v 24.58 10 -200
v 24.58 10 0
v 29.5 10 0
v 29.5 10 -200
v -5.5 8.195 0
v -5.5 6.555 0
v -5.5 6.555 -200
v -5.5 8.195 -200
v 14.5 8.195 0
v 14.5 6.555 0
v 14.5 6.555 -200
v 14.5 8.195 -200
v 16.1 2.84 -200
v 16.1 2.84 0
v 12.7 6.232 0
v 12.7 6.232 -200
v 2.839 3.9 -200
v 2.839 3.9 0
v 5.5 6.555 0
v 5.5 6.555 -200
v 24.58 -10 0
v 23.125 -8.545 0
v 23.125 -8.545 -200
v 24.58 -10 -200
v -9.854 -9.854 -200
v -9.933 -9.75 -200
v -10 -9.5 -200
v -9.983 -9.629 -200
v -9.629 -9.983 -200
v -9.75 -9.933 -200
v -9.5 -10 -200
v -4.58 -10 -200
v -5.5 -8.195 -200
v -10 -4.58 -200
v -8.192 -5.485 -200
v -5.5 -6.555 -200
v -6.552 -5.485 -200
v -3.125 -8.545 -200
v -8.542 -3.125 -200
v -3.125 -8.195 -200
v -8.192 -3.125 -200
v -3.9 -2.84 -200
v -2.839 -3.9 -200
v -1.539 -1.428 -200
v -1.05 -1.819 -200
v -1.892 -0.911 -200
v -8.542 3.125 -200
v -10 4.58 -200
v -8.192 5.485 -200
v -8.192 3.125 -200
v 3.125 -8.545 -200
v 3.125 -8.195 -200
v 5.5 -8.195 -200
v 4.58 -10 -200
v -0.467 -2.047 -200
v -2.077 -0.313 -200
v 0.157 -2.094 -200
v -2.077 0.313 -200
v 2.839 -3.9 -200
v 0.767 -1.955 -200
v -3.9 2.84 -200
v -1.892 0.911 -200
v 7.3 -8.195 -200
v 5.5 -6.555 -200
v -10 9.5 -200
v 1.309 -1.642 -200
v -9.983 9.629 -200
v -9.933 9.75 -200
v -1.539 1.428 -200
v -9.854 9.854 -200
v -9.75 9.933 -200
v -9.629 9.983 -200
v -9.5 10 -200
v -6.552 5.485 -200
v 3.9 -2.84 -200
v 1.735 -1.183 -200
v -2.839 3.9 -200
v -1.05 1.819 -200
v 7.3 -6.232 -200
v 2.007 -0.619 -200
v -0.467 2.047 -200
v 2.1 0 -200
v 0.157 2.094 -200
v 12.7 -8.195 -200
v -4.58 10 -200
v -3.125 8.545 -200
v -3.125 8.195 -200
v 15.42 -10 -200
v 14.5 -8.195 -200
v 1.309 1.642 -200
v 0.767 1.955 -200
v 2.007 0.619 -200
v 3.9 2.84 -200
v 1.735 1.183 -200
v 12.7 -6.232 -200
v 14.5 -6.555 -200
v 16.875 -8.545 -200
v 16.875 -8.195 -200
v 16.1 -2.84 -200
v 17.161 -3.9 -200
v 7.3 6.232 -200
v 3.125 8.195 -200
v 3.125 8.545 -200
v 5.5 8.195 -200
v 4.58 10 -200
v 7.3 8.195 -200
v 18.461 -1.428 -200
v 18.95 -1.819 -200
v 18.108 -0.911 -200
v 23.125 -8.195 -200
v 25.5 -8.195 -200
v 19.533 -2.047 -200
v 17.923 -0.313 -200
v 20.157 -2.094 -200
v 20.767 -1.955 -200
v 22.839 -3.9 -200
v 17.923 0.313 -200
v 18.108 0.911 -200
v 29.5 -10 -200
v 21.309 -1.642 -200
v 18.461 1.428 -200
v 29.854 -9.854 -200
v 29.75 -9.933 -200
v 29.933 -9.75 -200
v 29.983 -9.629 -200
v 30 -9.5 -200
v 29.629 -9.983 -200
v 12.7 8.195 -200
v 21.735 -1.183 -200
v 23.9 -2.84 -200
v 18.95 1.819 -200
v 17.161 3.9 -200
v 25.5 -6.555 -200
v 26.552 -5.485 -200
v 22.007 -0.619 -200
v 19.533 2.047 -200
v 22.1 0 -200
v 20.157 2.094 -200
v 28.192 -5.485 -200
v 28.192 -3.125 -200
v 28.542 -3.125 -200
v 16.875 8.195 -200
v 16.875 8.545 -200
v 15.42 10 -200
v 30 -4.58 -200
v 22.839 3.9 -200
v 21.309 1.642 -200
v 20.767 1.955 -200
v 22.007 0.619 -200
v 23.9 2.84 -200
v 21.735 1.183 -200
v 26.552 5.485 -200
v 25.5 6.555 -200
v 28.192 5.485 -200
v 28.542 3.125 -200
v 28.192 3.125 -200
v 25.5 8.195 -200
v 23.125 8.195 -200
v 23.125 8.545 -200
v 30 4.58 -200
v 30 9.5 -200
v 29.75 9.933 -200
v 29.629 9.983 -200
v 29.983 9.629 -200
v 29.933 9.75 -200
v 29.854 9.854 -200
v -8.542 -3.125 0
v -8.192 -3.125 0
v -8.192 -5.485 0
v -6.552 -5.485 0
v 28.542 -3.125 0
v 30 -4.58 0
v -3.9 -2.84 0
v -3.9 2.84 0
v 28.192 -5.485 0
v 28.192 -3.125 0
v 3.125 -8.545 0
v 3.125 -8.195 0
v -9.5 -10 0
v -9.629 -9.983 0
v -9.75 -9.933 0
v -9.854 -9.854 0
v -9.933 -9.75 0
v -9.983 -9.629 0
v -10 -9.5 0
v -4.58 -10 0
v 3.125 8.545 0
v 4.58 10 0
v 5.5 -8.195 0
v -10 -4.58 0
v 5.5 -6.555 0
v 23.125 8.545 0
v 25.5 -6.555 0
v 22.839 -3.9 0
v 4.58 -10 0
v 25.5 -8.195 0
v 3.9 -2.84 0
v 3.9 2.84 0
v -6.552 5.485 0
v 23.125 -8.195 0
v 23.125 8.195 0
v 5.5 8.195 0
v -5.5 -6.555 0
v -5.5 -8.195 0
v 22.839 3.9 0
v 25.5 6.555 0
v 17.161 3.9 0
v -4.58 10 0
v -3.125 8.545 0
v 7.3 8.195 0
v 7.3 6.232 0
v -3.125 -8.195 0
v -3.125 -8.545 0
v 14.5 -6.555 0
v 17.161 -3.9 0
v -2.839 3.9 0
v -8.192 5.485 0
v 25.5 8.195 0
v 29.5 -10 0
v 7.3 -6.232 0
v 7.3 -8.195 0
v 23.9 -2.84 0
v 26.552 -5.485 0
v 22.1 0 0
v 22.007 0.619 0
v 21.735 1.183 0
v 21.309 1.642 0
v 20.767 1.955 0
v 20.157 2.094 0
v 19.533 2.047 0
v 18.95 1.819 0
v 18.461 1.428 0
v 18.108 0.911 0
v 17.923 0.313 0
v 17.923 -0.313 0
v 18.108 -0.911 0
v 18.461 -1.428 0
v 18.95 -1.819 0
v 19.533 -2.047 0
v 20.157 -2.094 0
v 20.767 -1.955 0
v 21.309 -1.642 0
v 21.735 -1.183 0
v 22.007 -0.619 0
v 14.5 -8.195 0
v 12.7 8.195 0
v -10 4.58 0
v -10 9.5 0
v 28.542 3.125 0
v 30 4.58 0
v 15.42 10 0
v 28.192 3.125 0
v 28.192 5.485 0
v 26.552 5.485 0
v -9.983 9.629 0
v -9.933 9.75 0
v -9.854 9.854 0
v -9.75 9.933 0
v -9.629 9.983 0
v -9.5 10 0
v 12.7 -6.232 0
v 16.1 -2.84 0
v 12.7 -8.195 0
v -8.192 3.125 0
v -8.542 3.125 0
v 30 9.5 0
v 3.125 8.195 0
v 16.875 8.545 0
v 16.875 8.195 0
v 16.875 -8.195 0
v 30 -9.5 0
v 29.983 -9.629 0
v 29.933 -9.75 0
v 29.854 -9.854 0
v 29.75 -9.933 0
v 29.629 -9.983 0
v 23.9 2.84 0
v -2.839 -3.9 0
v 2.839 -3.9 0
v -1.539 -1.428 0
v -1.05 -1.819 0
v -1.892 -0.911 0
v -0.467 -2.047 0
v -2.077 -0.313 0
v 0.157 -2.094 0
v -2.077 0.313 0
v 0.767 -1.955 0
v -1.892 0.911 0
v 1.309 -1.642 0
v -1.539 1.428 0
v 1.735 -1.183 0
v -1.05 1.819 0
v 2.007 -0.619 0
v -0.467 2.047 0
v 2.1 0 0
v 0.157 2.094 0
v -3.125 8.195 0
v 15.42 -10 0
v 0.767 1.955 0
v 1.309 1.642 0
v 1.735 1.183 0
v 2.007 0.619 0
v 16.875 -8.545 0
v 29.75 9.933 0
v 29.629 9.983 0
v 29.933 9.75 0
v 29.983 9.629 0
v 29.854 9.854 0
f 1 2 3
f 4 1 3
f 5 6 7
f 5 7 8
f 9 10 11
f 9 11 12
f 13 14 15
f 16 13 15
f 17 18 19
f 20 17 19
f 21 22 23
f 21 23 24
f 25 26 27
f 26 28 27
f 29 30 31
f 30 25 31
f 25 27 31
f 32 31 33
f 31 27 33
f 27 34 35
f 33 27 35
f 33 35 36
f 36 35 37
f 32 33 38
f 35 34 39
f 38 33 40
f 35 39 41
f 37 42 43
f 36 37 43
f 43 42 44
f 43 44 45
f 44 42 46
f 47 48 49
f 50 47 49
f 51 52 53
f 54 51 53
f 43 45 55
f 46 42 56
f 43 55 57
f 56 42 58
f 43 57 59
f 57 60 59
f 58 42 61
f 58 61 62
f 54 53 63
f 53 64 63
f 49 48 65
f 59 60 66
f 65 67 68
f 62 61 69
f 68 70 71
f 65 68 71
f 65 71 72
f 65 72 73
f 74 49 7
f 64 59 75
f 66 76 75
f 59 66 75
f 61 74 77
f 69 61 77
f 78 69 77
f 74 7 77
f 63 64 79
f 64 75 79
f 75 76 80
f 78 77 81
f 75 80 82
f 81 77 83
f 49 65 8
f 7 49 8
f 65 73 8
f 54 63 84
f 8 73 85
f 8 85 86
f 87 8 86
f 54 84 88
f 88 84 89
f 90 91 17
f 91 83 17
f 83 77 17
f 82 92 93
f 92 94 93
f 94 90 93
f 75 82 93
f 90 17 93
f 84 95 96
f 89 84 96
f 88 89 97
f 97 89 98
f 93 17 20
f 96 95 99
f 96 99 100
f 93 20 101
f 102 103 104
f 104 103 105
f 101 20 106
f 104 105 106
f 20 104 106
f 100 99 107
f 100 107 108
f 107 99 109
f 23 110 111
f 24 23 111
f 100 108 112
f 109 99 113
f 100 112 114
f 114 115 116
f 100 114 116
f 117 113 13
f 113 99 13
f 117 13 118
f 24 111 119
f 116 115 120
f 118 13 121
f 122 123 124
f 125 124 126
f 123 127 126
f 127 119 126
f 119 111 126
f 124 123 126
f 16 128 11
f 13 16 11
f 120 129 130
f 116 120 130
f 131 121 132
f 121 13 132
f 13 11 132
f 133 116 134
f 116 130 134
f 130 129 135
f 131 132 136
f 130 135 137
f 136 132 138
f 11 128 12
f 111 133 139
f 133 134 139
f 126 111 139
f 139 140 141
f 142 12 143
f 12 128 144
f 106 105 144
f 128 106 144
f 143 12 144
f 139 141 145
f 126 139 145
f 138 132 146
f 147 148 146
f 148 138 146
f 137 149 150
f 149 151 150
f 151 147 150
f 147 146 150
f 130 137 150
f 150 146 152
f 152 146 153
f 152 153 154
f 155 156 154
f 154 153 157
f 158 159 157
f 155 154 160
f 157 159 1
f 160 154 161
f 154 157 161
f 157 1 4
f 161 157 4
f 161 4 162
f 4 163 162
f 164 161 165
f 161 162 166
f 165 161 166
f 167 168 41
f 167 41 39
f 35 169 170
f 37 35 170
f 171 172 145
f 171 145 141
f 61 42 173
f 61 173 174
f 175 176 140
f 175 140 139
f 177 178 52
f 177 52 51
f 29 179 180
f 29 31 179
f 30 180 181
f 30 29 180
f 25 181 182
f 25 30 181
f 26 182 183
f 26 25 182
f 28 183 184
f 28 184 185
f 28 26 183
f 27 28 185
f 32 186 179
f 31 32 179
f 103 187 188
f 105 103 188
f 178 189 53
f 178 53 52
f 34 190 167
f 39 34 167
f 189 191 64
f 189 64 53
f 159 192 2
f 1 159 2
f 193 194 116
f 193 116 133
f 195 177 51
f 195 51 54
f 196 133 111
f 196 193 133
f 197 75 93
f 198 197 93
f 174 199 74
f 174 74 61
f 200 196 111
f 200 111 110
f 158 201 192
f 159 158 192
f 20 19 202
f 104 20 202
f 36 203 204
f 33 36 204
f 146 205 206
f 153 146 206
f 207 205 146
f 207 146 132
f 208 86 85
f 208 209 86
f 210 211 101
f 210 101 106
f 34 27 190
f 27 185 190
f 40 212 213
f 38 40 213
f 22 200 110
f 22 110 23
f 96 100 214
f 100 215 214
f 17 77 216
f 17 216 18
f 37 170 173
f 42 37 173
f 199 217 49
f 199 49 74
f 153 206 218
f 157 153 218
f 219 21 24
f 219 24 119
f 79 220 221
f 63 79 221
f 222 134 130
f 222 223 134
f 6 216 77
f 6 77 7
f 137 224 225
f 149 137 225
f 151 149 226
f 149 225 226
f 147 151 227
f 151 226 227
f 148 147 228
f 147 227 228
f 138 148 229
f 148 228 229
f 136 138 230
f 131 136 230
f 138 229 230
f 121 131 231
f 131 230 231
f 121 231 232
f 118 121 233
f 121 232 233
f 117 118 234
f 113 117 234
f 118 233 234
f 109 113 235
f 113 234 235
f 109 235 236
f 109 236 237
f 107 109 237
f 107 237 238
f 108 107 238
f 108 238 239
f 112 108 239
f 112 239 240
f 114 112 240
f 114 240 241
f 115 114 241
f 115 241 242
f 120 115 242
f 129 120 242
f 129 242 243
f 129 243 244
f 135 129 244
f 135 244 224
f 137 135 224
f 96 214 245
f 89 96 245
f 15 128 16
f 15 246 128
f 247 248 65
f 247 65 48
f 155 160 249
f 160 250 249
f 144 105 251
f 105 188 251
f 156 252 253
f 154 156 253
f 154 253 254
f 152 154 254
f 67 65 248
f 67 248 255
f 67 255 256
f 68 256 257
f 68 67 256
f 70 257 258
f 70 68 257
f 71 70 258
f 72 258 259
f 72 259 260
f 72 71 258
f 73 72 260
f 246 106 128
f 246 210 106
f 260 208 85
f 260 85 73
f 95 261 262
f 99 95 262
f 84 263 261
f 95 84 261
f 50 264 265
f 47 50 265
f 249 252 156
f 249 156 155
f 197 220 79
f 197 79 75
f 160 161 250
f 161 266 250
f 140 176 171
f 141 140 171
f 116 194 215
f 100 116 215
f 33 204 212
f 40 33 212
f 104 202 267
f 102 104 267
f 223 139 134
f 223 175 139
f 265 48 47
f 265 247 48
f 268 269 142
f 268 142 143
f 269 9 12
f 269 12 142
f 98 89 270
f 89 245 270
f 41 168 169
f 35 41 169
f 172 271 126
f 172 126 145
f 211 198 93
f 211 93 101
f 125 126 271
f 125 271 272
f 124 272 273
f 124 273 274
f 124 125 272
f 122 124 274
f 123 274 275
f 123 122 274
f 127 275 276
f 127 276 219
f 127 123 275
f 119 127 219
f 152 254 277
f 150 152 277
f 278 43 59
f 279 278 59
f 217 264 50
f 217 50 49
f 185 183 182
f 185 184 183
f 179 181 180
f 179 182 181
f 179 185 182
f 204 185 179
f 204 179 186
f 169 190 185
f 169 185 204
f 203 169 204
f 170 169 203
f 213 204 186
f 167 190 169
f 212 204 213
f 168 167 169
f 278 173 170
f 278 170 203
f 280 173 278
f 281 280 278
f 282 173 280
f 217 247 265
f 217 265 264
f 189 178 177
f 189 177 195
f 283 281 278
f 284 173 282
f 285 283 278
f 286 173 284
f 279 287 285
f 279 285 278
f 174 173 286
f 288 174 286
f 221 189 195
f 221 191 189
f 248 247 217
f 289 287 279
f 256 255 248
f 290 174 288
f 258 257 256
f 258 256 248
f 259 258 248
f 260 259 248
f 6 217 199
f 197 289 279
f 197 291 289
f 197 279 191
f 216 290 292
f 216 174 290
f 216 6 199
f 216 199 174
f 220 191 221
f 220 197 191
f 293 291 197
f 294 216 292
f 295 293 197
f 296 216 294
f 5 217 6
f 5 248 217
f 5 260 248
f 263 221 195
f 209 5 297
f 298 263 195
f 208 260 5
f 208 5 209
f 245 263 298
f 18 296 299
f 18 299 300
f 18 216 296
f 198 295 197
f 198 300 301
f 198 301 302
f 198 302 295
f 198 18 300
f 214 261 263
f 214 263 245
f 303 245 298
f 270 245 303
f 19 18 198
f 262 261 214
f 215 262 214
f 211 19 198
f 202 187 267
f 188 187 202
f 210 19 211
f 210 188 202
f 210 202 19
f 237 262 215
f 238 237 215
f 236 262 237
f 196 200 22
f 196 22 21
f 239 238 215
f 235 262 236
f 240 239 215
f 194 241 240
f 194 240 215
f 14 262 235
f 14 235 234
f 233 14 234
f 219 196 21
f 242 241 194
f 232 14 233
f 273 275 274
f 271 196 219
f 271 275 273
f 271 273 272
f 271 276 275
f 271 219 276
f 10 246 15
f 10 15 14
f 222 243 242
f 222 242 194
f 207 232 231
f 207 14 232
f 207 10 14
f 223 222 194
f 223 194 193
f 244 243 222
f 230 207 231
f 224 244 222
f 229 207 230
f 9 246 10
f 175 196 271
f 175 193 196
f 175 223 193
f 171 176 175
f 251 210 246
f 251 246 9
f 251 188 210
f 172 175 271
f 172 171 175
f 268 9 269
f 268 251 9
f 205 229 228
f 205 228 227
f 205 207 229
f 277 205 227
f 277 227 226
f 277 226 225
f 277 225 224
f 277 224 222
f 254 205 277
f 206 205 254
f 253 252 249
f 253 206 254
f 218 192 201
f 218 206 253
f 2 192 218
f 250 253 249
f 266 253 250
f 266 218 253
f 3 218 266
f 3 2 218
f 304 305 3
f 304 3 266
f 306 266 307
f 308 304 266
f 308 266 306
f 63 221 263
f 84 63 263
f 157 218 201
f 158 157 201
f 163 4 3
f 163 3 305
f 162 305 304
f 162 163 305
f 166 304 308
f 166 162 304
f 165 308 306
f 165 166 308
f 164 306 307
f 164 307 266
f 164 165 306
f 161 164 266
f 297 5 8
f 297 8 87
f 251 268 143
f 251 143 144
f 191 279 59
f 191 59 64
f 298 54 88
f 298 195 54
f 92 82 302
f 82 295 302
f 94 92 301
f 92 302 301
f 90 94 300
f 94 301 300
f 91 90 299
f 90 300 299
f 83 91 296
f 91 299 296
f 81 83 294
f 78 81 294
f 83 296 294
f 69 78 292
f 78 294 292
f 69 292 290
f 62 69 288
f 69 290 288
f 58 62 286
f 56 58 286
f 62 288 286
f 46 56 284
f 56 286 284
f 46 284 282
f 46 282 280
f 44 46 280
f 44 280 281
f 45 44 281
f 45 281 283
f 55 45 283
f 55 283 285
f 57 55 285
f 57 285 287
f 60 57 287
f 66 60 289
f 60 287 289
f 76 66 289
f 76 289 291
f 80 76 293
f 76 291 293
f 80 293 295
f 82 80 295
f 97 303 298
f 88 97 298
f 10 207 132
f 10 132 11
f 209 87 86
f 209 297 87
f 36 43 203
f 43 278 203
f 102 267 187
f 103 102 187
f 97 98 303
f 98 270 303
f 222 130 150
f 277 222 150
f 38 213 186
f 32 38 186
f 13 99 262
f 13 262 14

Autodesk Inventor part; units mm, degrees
ref_plane "YZ Plane" through (0, 0, 0) normal (1, 0, 0) x (0, 1, 0)
ref_plane "XZ Plane" through (0, 0, 0) normal (0, 1, 0) x (-1, 0, 0)
ref_plane "XY Plane" through (0, 0, 0) normal (0, 0, 1) x (1, 0, 0)
sketch "Boceto1" plane through (0, 0, 0) normal (0, 0, 1) x (1, 0, 0)
  circle A0 centre (0, 0) radius 2.1
  line L0 (-12, 0) -> (12, 0)
  line L1 (0, 12) -> (0, -12)
  line L2 (0, 3.9) -> (-2.8387, 3.9)
  line L3 (-2.8387, 3.9) -> (-5.5, 6.555)
  line L4 (-5.5, 6.555) -> (-5.5, 8.195)
  line L5 (-5.5, 8.195) -> (-3.125, 8.195)
  line L6 (-3.125, 8.545) -> (-4.58, 10)
  line L7 (-4.58, 10) -> (-10, 10)
  line L8 (-10, 10) -> (-10, 4.58)
  line L9 (-10, 4.58) -> (-8.5415, 3.125)
  line L10 (-8.1915, 3.125) -> (-8.1915, 5.4852)
  line L11 (-8.1915, 5.4852) -> (-6.5515, 5.4852)
  line L12 (-6.5515, 5.4852) -> (-3.9, 2.84)
  line L13 (-3.9, 2.84) -> (-3.9, 0)
  line L14 (3.125, 8.545) -> (4.58, 10)
  line L15 (5.5, 8.195) -> (3.125, 8.195)
  line L16 (5.5, 6.555) -> (5.5, 8.195)
  line L17 (2.8387, 3.9) -> (5.5, 6.555)
  line L18 (0, 3.9) -> (2.8387, 3.9)
  line L19 (3.9, 2.84) -> (3.9, 0)
  line L20 (-10, -10) -> (-10, -4.58)
  line L21 (-4.58, -10) -> (-10, -10)
  line L22 (-3.125, -8.545) -> (-4.58, -10)
  line L23 (-5.5, -8.195) -> (-3.125, -8.195)
  line L24 (-5.5, -6.555) -> (-5.5, -8.195)
  line L25 (-2.8387, -3.9) -> (-5.5, -6.555)
  line L26 (0, -3.9) -> (-2.8387, -3.9)
  line L27 (0, -3.9) -> (2.8387, -3.9)
  line L28 (2.8387, -3.9) -> (5.5, -6.555)
  line L29 (5.5, -6.555) -> (5.5, -8.195)
  line L30 (5.5, -8.195) -> (3.125, -8.195)
  line L31 (3.125, -8.545) -> (4.58, -10)
  line L32 (7.3, -6.2319) -> (3.9, -2.84)
  line L33 (3.9, -2.84) -> (3.9, 0)
  line L34 (-3.9, -2.84) -> (-3.9, 0)
  line L35 (-6.5515, -5.4852) -> (-3.9, -2.84)
  line L36 (-8.1915, -5.4852) -> (-6.5515, -5.4852)
  line L37 (-8.1915, -3.125) -> (-8.1915, -5.4852)
  line L38 (-10, -4.58) -> (-8.5415, -3.125)
  line L39 (-3.125, 8.195) -> (-3.125, 8.545)
  line L40 (-8.1915, 3.125) -> (-8.5415, 3.125)
  line L41 (3.125, 8.195) -> (3.125, 8.545)
  line L42 (-8.1915, -3.125) -> (-8.5415, -3.125)
  line L43 (-3.125, -8.195) -> (-3.125, -8.545)
  line L44 (3.125, -8.195) -> (3.125, -8.545)
  line L45 (10, 12) -> (10, -12)
  line L46 (16.875, 8.195) -> (16.875, 8.545)
  line L47 (14.5, 8.195) -> (16.875, 8.195)
  line L48 (14.5, 6.555) -> (14.5, 8.195)
  line L49 (16.875, 8.545) -> (15.42, 10)
  line L50 (17.1613, 3.9) -> (14.5, 6.555)
  line L51 (20, 3.9) -> (17.1613, 3.9)
  line L52 (32, 0) -> (8, 0)
  line L53 (20, 3.9) -> (22.8387, 3.9)
  line L54 (23.125, 8.195) -> (23.125, 8.545)
  circle A1 centre (20, 0) radius 2.1
  line L55 (23.9, -2.84) -> (23.9, 0)
  line L56 (26.5515, -5.4852) -> (23.9, -2.84)
  line L57 (28.1915, -5.4852) -> (26.5515, -5.4852)
  line L58 (24.58, -10) -> (30, -10)
  line L59 (30, -10) -> (30, -4.58)
  line L60 (28.1915, -3.125) -> (28.1915, -5.4852)
  line L61 (30, -4.58) -> (28.5415, -3.125)
  line L62 (28.1915, -3.125) -> (28.5415, -3.125)
  line L63 (22.8387, -3.9) -> (25.5, -6.555)
  line L64 (25.5, -8.195) -> (23.125, -8.195)
  line L65 (23.125, -8.195) -> (23.125, -8.545)
  line L66 (23.125, -8.545) -> (24.58, -10)
  line L67 (20, -3.9) -> (22.8387, -3.9)
  line L68 (20, -3.9) -> (17.1613, -3.9)
  line L69 (16.875, -8.195) -> (16.875, -8.545)
  line L70 (25.5, -6.555) -> (25.5, -8.195)
  line L71 (12.7, -6.2319) -> (16.1, -2.84)
  line L72 (17.1613, -3.9) -> (14.5, -6.555)
  line L73 (14.5, -8.195) -> (16.875, -8.195)
  line L74 (16.875, -8.545) -> (15.42, -10)
  line L75 (14.5, -6.555) -> (14.5, -8.195)
  line L76 (20, 12) -> (20, -12)
  line L77 (22.8387, 3.9) -> (25.5, 6.555)
  line L78 (25.5, 6.555) -> (25.5, 8.195)
  line L79 (25.5, 8.195) -> (23.125, 8.195)
  line L80 (23.125, 8.545) -> (24.58, 10)
  line L81 (24.58, 10) -> (30, 10)
  line L82 (30, 10) -> (30, 4.58)
  line L83 (30, 4.58) -> (28.5415, 3.125)
  line L84 (28.1915, 3.125) -> (28.1915, 5.4852)
  line L85 (28.1915, 5.4852) -> (26.5515, 5.4852)
  line L86 (26.5515, 5.4852) -> (23.9, 2.84)
  line L87 (23.9, 2.84) -> (23.9, 0)
  line L88 (28.1915, 3.125) -> (28.5415, 3.125)
  line L89 (16.1, 2.84) -> (16.1, 0)
  line L90 (16.1, -2.84) -> (16.1, 0)
  line L91 (7.3, -6.2319) -> (7.3, -8.195)
  line L92 (7.3, -8.195) -> (12.7, -8.195)
  line L93 (12.7, -8.195) -> (12.7, -6.2319)
  line L94 (4.58, 10) -> (15.42, 10)
  line L95 (4.58, -10) -> (15.42, -10)
  line L96 (3.9, 2.84) -> (7.3, 6.2319)
  line L97 (7.3, 6.2319) -> (7.3, 8.195)
  line L98 (7.3, 8.195) -> (12.7, 8.195)
  line L99 (12.7, 8.195) -> (12.7, 6.2319)
  line L100 (16.1, 2.84) -> (12.7, 6.2319)
  point P0 (10, 0)
  dimension "d0" = 4.2
  dimension "d1" = 24
  dimension "d2" = 24
  dimension "d3" = 90
  dimension "d6" = 20
  dimension "d7" = 1.5
  dimension "d8" = 1.64
  dimension "d9" = 1.64
  dimension "d10" = 7.8
  dimension "d11" = 11
  dimension "d12" = 9.16
  dimension "d14" = 6.25
  dimension "d15" = 6.25
  dimension "d16" = 0.35
  dimension "d17" = 7.8
  dimension "d18" = 0.35
  dimension "d20" = 24
  dimension "d24" = 12.2
  dimension "d25" = 9.16
  dimension "d26" = 5.68
  dimension "d31" = 5.4
  dimension "d32" = 5.4
  dimension "d34" = 40
extrude "Extrusión1" add sketch "Boceto1" against normal blind 200 contours L0 L33 L32 L91 L92 L45 L95 L31 L44 L30 L29 L28 L27 L1 A0 | A0 L1 L18 L17 L16 L15 L41 L14 L94 L45 L98 L97 L96 L19 L0 | A0 L0 L13 L12 L11 L10 L40 L9 L8 L7 L6 L39 L5 L4 L3 L2 L1 | L1 L26 L25 L24 L23 L43 L22 L21 L20 L38 L42 L37 L36 L35 L34 L0 A0 | L45 L94 L49 L46 L47 L48 L50 L51 L76 A1 L52 L89 L100 L99 L98 | L92 L93 L71 L90 L52 A1 L76 L68 L72 L75 L73 L69 L74 L95 L45 | L76 L53 L77 L78 L79 L54 L80 L81 L82 L83 L88 L84 L85 L86 L87 L52 A1 | A1 L52 L55 L56 L57 L60 L62 L61 L59 L58 L66 L65 L64 L70 L63 L67 L76
fillet "Empalme1" radius 0.5 4 edges at (-10, 10, -100) (30, 10, -100) (30, -10, -100) (-10, -10, -100)
properties part number "Perfil2040" material "Aluminio 6061"
